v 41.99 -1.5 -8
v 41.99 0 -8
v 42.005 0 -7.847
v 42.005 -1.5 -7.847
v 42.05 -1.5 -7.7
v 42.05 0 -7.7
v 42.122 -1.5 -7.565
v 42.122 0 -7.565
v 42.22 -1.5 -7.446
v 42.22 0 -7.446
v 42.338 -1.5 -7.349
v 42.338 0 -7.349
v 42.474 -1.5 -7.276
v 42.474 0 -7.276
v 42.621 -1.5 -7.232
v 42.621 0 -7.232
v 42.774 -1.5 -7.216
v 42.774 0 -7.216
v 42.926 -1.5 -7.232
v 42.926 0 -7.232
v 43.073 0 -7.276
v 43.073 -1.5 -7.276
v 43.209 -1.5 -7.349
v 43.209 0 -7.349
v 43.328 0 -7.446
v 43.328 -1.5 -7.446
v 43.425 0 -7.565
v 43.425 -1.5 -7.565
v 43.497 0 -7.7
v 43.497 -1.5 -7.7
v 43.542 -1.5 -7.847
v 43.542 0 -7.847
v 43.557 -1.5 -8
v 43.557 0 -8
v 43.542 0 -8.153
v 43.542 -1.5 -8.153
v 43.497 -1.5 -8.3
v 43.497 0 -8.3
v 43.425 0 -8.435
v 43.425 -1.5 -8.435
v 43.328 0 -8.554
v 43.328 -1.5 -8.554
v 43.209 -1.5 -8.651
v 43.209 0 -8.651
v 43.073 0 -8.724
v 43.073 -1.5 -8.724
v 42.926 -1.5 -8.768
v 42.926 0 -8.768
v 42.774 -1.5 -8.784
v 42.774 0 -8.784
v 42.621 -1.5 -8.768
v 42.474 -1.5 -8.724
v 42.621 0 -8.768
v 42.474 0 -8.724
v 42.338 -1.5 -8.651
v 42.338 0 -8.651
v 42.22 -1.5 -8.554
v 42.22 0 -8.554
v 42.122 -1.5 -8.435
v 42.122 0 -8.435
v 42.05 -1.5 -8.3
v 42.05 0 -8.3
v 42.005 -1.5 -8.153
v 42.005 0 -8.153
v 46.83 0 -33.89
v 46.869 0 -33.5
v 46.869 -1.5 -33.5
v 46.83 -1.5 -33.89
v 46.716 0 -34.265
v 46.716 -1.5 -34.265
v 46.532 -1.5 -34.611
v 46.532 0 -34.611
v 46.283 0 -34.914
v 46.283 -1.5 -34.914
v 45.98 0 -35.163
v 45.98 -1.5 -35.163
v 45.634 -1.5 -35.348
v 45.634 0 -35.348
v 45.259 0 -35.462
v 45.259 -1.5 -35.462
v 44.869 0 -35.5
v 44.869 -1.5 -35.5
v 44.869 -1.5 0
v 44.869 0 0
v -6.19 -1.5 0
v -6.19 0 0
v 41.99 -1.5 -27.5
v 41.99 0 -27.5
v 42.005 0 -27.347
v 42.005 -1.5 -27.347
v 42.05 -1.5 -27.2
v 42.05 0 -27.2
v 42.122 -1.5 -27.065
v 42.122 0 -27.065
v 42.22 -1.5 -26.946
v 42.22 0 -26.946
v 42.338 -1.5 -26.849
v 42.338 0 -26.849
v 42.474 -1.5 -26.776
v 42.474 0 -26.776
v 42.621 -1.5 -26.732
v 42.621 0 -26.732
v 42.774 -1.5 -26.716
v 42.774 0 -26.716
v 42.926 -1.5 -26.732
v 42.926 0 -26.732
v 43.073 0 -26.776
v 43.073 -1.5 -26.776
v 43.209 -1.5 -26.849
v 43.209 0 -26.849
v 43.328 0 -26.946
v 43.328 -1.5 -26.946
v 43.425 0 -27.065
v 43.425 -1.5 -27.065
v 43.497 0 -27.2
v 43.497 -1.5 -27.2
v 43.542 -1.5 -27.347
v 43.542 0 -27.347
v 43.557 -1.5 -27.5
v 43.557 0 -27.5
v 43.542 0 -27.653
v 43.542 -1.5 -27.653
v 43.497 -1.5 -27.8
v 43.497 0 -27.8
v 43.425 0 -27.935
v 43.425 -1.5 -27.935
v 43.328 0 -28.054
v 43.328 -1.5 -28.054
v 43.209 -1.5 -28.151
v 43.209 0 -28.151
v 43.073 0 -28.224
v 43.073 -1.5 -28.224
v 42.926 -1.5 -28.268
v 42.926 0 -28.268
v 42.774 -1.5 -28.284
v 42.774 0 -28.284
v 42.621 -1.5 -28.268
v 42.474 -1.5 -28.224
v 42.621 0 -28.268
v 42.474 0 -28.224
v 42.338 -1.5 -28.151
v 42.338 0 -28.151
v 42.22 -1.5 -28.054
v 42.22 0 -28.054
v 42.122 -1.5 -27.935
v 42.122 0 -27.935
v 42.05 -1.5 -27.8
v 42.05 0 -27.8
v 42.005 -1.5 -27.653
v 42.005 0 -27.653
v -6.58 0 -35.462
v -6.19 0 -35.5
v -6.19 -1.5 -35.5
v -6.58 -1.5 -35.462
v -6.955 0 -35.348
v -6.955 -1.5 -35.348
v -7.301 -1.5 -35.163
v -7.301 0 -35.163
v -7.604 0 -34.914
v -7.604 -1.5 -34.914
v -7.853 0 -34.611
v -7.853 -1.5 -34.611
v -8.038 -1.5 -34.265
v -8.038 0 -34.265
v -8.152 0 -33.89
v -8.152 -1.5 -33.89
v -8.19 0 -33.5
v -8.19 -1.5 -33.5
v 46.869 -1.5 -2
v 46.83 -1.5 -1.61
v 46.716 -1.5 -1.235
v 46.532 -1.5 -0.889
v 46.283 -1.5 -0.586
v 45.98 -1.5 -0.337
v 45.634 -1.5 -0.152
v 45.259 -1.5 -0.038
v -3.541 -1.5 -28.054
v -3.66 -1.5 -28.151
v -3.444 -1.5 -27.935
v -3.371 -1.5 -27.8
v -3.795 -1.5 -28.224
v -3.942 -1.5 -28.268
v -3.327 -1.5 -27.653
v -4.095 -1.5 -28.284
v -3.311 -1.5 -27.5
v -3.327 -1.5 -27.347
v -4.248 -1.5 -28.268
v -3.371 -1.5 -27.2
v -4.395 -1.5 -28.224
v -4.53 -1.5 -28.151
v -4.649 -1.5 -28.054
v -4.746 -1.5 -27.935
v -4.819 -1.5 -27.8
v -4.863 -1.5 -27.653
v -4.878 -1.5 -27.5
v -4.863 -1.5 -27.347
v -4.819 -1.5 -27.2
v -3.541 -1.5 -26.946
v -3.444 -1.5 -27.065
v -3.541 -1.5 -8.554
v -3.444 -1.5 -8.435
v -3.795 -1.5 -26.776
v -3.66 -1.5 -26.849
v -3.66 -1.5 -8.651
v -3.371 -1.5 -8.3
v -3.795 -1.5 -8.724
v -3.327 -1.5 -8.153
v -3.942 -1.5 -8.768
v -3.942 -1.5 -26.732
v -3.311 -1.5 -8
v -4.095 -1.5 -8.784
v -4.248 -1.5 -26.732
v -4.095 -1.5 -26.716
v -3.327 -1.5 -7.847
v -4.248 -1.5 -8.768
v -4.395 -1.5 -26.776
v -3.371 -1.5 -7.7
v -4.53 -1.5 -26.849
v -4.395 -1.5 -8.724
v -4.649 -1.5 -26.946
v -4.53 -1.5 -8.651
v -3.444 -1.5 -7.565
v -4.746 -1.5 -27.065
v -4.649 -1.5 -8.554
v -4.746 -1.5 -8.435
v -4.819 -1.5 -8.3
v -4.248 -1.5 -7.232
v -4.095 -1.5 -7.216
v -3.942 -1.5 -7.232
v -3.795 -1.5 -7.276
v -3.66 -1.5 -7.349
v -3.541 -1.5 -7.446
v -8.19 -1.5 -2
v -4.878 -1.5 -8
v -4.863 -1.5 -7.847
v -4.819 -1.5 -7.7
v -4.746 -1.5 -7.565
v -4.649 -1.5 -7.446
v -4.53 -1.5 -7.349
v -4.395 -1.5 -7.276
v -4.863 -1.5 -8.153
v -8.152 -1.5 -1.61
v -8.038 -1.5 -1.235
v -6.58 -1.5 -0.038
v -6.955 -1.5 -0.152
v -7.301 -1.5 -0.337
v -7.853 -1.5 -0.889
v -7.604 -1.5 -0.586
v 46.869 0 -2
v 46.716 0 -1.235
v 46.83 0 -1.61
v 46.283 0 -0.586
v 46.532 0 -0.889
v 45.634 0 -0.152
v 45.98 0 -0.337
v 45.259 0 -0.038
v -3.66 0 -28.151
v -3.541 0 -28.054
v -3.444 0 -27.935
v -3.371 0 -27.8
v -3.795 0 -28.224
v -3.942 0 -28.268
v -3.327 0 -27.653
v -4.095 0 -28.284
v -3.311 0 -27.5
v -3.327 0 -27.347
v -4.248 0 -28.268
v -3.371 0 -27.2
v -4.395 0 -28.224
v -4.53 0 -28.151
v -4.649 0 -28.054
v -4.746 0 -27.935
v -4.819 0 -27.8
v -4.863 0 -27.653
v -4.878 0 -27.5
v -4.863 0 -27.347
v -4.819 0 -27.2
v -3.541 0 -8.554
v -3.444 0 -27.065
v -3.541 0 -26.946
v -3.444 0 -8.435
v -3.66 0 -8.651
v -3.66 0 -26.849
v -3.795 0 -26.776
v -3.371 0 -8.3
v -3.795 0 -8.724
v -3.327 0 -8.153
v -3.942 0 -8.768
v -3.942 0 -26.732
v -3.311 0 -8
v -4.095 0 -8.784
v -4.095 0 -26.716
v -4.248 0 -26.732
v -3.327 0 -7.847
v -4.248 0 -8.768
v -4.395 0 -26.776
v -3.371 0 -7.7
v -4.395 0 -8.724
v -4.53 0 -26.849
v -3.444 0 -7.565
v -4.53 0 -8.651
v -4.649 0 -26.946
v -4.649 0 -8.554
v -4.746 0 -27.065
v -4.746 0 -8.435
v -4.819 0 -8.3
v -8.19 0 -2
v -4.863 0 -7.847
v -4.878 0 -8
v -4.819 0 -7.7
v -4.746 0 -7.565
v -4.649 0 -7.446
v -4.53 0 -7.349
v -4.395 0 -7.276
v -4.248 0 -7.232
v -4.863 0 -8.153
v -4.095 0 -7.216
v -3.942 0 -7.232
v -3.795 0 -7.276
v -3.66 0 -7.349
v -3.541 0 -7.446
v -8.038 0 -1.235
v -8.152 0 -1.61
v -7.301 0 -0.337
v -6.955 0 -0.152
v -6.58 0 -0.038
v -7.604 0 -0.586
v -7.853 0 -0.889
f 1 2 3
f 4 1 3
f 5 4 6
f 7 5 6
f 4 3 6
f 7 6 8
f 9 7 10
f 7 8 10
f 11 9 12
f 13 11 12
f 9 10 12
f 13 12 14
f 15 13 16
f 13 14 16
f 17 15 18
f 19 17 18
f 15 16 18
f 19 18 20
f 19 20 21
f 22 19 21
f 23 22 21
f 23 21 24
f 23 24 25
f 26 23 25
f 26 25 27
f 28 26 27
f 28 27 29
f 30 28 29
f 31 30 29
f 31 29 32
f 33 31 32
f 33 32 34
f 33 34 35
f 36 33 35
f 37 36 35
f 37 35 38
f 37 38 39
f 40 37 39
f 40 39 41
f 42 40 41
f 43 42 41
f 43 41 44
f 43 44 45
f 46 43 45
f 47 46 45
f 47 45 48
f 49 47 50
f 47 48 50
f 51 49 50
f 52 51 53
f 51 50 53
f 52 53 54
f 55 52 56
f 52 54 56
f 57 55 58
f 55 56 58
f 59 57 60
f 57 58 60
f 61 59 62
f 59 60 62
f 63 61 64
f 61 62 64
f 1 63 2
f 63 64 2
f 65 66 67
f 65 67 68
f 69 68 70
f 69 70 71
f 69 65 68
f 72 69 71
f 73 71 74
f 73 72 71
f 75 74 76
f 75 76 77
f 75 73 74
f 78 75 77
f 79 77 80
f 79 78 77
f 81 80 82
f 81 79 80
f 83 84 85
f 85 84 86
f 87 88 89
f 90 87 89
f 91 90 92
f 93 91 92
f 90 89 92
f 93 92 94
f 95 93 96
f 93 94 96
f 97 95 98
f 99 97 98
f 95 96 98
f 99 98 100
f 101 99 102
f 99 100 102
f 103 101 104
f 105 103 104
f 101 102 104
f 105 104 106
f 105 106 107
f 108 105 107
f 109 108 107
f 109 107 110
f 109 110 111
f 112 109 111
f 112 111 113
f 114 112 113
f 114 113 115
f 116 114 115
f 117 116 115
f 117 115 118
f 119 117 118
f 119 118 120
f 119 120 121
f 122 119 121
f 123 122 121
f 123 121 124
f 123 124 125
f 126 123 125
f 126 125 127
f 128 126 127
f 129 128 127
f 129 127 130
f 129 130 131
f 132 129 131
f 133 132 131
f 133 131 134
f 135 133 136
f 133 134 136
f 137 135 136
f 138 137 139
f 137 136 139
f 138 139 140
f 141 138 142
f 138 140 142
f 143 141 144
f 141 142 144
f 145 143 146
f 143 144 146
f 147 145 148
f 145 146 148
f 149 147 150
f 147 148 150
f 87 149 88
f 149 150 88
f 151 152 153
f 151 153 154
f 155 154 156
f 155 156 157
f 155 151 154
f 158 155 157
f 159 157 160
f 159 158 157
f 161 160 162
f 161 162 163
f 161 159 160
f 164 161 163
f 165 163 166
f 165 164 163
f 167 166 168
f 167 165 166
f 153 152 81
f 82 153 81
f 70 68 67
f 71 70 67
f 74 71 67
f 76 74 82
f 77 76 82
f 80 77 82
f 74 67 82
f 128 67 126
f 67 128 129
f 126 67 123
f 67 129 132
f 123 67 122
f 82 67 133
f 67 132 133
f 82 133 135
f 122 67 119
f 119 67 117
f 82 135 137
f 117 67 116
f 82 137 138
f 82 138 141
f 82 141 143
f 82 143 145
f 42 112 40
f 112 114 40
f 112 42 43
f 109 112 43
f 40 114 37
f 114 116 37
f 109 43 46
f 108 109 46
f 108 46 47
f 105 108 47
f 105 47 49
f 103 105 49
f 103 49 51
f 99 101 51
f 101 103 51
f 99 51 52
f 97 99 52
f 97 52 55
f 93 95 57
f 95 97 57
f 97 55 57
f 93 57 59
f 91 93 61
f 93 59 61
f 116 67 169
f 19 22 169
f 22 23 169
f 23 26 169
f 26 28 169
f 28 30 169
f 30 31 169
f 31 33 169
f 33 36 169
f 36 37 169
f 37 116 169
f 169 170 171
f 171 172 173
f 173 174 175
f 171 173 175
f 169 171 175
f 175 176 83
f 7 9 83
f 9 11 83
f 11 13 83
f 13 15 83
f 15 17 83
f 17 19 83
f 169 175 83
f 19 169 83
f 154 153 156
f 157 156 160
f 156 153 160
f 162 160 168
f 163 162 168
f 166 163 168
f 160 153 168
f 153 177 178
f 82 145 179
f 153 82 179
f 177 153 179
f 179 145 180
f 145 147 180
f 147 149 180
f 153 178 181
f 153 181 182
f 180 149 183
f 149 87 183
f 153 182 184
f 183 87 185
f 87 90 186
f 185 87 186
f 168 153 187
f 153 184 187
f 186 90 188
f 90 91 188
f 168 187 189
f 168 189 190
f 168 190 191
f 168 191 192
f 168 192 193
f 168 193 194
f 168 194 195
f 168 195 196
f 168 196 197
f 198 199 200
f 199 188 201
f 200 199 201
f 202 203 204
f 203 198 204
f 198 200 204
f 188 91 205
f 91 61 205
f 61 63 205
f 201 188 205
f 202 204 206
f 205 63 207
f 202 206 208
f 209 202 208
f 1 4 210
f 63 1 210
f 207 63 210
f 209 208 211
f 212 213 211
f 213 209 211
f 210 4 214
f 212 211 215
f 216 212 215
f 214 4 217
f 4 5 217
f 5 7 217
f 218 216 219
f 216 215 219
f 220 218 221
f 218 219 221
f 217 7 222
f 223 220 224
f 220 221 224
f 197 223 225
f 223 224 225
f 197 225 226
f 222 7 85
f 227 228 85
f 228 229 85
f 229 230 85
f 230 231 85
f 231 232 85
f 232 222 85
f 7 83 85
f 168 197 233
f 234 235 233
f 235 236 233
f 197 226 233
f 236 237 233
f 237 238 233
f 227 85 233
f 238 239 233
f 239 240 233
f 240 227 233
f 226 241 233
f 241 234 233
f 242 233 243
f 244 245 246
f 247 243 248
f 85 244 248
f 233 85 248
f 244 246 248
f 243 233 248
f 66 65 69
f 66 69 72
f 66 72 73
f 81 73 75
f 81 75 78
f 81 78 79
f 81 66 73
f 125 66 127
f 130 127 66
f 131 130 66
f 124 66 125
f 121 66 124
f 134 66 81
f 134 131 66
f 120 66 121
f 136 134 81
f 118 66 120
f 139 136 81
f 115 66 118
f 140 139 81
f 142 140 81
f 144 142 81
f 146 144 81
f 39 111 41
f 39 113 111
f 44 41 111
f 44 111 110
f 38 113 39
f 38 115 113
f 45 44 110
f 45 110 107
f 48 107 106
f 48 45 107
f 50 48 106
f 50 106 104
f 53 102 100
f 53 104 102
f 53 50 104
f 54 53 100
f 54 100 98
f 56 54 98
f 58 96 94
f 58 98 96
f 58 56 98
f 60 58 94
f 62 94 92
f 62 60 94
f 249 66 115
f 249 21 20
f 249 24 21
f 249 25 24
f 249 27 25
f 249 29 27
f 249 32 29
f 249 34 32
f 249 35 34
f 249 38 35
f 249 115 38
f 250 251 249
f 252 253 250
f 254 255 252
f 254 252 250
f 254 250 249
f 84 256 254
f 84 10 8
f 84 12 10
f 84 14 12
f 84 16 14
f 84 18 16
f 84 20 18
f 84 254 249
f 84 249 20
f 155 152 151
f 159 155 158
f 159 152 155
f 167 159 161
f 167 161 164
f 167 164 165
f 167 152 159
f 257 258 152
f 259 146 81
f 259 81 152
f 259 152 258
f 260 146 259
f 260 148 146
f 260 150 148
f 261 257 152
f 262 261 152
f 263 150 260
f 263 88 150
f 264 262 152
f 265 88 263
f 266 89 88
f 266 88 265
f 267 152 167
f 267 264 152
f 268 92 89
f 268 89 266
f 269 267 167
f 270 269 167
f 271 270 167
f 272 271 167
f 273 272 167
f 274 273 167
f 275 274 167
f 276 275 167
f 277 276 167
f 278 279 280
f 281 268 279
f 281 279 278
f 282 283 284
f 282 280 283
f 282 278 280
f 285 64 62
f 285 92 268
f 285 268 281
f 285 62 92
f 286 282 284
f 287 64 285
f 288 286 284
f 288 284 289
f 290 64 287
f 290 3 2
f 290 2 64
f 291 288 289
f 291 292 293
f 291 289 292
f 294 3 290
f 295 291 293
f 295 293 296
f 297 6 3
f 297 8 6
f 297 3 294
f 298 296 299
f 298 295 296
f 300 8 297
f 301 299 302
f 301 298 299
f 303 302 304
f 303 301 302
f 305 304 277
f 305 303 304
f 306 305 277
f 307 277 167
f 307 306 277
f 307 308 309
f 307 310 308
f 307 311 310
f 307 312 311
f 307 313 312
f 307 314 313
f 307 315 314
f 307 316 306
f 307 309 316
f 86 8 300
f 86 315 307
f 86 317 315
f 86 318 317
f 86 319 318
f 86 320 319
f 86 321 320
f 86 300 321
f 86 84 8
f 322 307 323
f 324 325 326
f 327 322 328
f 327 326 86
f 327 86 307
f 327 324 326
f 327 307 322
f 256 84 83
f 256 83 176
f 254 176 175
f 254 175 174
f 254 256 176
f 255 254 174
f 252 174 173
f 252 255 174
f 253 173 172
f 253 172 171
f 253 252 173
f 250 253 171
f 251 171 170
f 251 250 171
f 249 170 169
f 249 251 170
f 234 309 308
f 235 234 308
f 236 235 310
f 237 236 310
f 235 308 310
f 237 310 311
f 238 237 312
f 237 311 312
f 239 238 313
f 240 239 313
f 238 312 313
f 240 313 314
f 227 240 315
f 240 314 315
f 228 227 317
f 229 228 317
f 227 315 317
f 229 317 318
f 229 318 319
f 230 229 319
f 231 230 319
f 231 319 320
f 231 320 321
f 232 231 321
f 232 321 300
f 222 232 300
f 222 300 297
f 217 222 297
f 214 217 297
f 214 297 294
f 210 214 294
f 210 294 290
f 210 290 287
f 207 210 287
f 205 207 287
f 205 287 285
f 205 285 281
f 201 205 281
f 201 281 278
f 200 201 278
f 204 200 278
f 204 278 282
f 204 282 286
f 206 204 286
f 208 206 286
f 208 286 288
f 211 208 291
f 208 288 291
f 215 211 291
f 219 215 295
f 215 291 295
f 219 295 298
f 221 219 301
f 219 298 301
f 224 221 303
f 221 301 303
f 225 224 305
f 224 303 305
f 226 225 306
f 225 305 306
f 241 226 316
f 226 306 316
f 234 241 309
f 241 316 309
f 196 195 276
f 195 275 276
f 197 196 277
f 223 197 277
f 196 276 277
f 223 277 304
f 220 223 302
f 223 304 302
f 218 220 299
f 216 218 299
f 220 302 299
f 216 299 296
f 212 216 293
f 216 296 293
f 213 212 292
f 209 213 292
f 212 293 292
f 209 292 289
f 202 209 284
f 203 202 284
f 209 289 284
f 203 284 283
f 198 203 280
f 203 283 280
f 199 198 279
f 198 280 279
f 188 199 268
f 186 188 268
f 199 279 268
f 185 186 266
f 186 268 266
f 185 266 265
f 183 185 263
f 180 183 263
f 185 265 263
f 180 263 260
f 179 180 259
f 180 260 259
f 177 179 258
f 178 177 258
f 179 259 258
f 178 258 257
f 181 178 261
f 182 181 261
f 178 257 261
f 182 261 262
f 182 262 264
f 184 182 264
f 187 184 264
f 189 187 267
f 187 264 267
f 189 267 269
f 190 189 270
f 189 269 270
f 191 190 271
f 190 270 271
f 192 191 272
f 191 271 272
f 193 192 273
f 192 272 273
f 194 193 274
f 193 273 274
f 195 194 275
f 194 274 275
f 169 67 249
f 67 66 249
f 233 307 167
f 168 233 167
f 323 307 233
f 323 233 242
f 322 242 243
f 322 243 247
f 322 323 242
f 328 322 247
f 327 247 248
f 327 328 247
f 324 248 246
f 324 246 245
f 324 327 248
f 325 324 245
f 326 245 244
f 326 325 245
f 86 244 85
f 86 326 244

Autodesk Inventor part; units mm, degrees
ref_plane "YZ Plane" through (0, 0, 0) normal (1, 0, 0) x (0, 1, 0)
ref_plane "XZ Plane" through (0, 0, 0) normal (0, 1, 0) x (-1, 0, 0)
ref_plane "XY Plane" through (0, 0, 0) normal (0, 0, 1) x (1, 0, 0)
sketch "Sketch1" plane through (0, 0, 0) normal (0, 1, 0) x (-1, 0, 0)
  line L0 (-0.4496, -35.5) -> (-0.4496, 0)
  line L1 (-38.2289, 0) -> (-38.2289, -35.5)
  circle A0 centre (-42.7736, -8) radius 0.7835
  circle A1 centre (-42.7736, -27.5) radius 0.7835
  circle A2 centre (4.095, -27.5) radius 0.7835
  circle A3 centre (4.095, -8) radius 0.7835
  arc A4 (-44.8686, 0) -> (-46.8686, -2) centre (-44.8686, -2) ccw
  line L2 (-46.8686, -33.5) -> (-46.8686, -2)
  arc A5 (-46.8686, -33.5) -> (-44.8686, -35.5) centre (-44.8686, -33.5) ccw
  arc A6 (8.19, -2) -> (6.19, 0) centre (6.19, -2) ccw
  line L3 (-44.8686, 0) -> (6.19, 0)
  arc A7 (6.19, -35.5) -> (8.19, -33.5) centre (6.19, -33.5) ccw
  line L4 (6.19, -35.5) -> (-44.8686, -35.5)
  line L5 (8.19, -2) -> (8.19, -33.5)
  line L6 (-38.6786, -35.5) -> (-38.6786, 0)
  line L7 (-37.7793, 0) -> (-37.7793, -35.5)
  line L8 (-0.8993, -35.5) -> (-0.8993, 0)
  line L9 (0, 0) -> (0, -35.5)
  point P0 (0, 0)
extrude "Plate1" add sketch "Sketch1" against normal blind 1.5
equation "\"d0\" = Thickness"
equation "\"BendReliefWidth\" = Thickness"
equation "\"BendReliefDepth\" = 0.5 * Thickness"
equation "\"CornerReliefSize\" = 4 * Thickness"
equation "\"MinimumRemnant\" = 2 * Thickness"
equation "\"TransitionRadius\" = BendRadius"
equation "\"JacobiRadiusSize\" = BendRadius"
equation "\"GapSize\" = Thickness"
equation "\"Thickness\" = 1.5"
equation "\"BendRadius\" = 0.31"
properties part number "CAM_ㄷ_frame_3" material "Aluminum 6061"
